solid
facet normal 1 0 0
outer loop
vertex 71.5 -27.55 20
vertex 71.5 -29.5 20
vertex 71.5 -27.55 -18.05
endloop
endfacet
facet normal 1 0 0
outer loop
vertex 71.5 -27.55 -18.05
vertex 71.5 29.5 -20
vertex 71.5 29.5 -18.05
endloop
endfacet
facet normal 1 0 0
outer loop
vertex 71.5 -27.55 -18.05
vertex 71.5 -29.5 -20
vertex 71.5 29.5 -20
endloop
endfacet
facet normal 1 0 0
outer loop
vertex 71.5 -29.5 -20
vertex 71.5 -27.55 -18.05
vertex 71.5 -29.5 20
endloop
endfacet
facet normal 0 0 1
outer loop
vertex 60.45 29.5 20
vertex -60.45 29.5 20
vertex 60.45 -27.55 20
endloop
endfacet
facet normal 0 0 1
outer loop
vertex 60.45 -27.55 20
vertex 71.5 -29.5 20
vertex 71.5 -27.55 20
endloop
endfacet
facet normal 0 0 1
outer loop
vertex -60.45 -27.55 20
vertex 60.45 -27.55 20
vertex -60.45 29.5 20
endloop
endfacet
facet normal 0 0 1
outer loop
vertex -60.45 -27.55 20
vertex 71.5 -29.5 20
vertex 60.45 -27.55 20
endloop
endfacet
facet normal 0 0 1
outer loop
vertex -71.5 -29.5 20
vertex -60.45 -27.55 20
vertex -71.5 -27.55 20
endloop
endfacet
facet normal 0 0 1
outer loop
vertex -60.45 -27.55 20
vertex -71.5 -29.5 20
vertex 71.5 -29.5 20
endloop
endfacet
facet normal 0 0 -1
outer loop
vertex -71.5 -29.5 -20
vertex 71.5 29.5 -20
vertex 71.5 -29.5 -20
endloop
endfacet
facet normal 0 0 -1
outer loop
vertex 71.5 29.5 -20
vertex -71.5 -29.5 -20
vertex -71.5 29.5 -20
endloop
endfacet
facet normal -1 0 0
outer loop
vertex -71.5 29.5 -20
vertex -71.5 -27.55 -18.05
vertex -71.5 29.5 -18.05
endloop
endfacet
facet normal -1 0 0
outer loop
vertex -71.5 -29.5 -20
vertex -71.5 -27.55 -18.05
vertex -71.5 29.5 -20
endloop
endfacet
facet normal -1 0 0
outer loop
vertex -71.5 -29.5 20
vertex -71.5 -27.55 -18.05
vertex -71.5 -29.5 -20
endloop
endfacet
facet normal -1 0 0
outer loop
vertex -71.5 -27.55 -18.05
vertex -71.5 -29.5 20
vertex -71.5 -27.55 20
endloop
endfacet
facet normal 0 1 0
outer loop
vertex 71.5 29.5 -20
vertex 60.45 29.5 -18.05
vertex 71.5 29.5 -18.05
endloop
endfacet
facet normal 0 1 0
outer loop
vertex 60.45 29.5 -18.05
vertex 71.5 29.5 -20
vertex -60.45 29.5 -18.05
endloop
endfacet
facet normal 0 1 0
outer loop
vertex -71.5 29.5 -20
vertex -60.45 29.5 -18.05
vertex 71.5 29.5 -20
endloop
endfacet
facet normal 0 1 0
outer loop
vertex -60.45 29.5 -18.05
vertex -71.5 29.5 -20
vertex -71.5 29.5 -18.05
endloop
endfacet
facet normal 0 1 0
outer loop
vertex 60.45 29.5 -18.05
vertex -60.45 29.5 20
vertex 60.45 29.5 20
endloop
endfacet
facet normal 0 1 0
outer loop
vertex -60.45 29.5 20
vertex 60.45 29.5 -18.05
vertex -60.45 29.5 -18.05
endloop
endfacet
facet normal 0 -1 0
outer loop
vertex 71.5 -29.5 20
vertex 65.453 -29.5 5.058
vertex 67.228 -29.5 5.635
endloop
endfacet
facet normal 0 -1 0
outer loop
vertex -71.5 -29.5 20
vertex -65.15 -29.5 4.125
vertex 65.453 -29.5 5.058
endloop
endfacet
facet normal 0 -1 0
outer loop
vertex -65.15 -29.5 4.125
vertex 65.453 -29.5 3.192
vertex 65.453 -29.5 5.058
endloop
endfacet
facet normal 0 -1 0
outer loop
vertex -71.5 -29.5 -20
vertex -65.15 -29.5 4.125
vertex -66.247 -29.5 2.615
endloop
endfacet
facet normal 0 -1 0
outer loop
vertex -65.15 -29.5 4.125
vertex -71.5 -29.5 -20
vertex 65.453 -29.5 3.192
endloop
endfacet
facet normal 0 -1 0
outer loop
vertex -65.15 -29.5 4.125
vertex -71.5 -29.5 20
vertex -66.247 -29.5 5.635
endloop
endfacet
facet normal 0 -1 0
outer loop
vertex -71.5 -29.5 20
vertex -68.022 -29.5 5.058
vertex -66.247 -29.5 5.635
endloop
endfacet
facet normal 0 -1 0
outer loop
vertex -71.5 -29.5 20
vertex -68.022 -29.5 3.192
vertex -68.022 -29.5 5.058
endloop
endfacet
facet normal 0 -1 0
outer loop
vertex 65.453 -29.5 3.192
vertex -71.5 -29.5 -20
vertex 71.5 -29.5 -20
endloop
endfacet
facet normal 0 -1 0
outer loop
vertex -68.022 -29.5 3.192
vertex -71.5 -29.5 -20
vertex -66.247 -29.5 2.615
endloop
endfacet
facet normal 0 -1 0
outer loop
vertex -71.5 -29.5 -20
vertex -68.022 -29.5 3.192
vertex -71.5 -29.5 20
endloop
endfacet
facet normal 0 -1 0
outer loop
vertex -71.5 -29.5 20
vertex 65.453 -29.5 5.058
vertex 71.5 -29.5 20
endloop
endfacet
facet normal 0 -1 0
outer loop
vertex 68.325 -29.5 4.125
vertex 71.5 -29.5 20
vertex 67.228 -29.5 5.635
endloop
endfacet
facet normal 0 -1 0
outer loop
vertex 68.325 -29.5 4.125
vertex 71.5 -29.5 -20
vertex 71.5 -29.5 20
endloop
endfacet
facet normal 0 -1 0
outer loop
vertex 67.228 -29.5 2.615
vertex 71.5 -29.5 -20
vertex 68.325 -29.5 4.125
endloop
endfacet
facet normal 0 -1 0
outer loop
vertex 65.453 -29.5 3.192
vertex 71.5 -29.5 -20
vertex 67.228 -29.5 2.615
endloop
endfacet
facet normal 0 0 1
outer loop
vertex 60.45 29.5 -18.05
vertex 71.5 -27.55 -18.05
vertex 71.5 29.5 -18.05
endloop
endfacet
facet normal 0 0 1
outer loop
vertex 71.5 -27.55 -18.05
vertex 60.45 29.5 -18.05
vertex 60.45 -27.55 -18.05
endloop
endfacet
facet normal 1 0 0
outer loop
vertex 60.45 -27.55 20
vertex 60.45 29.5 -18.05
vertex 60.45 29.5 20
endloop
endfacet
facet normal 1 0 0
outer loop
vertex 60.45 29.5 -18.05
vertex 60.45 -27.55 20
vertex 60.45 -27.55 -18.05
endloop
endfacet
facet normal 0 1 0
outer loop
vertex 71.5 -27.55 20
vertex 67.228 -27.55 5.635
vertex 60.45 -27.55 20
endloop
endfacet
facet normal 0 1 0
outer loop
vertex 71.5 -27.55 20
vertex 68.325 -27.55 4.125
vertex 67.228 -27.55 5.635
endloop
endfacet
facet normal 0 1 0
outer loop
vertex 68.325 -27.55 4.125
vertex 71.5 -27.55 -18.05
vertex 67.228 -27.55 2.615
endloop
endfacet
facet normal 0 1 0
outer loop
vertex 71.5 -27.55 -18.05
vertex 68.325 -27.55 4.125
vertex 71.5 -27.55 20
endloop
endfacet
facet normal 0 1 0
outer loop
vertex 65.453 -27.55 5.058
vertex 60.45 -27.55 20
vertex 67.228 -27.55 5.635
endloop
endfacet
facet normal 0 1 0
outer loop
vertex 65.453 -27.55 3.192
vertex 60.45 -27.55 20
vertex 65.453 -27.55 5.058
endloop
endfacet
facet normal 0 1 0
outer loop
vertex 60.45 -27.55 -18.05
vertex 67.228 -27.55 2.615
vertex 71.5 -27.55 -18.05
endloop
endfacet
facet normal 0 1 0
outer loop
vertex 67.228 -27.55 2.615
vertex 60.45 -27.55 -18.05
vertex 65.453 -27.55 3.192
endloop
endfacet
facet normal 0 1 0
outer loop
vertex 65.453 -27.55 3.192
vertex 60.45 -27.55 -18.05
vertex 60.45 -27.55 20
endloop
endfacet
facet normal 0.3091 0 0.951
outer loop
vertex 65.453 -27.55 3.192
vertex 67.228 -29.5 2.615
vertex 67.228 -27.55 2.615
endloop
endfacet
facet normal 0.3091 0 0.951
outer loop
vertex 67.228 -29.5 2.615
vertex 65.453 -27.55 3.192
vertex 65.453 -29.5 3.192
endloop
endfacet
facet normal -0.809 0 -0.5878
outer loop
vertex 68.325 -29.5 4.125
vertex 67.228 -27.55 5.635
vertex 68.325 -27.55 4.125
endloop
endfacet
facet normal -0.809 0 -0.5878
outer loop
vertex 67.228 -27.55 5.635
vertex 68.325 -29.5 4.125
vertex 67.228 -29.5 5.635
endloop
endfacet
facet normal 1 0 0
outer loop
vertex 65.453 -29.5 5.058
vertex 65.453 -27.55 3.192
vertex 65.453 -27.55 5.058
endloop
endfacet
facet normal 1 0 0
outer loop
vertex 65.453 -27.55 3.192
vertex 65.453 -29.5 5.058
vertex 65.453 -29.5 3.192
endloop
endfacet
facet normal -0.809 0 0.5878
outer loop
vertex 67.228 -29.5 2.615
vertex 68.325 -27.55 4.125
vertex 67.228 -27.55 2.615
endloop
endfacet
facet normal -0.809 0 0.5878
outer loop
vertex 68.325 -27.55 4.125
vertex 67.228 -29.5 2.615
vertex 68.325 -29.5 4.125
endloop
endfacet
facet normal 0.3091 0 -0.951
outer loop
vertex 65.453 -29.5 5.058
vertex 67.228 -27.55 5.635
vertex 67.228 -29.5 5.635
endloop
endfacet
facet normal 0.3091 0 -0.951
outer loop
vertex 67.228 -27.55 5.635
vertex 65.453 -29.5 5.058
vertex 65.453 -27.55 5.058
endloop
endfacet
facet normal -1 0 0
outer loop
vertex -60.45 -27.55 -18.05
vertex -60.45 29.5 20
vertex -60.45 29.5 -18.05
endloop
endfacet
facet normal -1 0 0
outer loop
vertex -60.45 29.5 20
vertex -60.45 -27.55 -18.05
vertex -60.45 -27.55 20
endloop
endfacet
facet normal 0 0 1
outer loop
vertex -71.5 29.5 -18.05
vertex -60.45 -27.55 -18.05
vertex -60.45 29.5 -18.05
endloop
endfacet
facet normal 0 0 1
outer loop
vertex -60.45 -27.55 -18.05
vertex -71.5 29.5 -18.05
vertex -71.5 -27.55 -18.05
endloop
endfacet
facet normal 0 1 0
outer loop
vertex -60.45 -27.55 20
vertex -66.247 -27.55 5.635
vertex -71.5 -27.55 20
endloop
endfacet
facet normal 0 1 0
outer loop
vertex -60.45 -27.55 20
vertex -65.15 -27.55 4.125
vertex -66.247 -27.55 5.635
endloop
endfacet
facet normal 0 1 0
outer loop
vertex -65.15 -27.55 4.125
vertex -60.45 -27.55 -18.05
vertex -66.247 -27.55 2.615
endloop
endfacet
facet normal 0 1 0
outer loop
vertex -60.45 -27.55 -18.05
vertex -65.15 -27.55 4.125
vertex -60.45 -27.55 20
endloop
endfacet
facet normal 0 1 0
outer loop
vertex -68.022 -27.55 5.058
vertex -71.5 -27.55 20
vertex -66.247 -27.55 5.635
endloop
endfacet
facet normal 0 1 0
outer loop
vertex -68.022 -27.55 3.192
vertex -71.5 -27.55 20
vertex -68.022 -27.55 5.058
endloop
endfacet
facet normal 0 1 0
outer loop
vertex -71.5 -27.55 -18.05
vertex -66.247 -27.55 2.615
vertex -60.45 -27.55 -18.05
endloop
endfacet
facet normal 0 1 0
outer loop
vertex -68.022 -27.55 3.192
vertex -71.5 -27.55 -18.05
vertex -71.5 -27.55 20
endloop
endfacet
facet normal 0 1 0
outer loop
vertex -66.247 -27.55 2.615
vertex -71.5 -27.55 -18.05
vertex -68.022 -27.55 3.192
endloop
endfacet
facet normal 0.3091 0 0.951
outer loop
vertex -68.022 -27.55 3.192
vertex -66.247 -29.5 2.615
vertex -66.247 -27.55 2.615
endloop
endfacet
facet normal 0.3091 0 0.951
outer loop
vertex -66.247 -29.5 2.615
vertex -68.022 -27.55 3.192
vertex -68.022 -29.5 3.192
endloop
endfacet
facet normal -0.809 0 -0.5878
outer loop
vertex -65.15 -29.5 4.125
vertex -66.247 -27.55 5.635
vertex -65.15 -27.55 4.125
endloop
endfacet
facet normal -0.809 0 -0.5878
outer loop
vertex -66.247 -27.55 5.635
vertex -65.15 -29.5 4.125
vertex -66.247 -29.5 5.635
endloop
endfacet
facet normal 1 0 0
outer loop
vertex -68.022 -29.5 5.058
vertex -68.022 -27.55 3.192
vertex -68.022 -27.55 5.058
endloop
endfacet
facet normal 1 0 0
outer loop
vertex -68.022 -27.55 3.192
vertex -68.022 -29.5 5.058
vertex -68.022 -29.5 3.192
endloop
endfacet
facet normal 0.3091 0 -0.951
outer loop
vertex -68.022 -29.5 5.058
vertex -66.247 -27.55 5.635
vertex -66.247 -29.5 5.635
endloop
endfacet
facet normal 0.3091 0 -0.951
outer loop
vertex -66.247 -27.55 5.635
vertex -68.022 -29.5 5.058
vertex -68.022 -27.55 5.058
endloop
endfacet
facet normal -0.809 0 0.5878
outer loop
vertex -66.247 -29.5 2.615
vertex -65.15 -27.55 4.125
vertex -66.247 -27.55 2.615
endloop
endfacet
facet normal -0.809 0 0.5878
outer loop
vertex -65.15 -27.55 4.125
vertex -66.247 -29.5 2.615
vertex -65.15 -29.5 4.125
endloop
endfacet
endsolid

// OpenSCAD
//
module power_supply() {
	l=143.0;
	d=59.0;
	h=40.0;
	il=11.0;
	wt=2.0;
	sd=3.175;

	difference() {
		cube([l,d,h],center=true);
		// 5V DC connections cutout
		translate([(l/2)-(il/2),wt/2,wt/2]) 
			cube([il+0.1,59-wt+0.1,h-wt+0.1],center=true);
		// screw hole on 5V DC side
		translate([(l/2)-(4.7625),-(d/2-wt-0.1),(h/2)-15.875]) 
			rotate([90,0,0]) 
				cylinder(d=sd,h=wt+0.2);

		// 120V AC connections cutout
		translate([-((l/2)-(il/2)),wt/2,wt/2]) 
			cube([il+0.1,59-wt+0.1,h-wt+0.1],center=true);
		// screw slot on 120V DC side
		translate([-((l/2)-(4.7625)),-(d/2-wt-0.1),(h/2)-15.875]) 
			rotate([90,0,0]) 
				cylinder(d=sd,h=wt+0.2);
	}
}

power_supply();
